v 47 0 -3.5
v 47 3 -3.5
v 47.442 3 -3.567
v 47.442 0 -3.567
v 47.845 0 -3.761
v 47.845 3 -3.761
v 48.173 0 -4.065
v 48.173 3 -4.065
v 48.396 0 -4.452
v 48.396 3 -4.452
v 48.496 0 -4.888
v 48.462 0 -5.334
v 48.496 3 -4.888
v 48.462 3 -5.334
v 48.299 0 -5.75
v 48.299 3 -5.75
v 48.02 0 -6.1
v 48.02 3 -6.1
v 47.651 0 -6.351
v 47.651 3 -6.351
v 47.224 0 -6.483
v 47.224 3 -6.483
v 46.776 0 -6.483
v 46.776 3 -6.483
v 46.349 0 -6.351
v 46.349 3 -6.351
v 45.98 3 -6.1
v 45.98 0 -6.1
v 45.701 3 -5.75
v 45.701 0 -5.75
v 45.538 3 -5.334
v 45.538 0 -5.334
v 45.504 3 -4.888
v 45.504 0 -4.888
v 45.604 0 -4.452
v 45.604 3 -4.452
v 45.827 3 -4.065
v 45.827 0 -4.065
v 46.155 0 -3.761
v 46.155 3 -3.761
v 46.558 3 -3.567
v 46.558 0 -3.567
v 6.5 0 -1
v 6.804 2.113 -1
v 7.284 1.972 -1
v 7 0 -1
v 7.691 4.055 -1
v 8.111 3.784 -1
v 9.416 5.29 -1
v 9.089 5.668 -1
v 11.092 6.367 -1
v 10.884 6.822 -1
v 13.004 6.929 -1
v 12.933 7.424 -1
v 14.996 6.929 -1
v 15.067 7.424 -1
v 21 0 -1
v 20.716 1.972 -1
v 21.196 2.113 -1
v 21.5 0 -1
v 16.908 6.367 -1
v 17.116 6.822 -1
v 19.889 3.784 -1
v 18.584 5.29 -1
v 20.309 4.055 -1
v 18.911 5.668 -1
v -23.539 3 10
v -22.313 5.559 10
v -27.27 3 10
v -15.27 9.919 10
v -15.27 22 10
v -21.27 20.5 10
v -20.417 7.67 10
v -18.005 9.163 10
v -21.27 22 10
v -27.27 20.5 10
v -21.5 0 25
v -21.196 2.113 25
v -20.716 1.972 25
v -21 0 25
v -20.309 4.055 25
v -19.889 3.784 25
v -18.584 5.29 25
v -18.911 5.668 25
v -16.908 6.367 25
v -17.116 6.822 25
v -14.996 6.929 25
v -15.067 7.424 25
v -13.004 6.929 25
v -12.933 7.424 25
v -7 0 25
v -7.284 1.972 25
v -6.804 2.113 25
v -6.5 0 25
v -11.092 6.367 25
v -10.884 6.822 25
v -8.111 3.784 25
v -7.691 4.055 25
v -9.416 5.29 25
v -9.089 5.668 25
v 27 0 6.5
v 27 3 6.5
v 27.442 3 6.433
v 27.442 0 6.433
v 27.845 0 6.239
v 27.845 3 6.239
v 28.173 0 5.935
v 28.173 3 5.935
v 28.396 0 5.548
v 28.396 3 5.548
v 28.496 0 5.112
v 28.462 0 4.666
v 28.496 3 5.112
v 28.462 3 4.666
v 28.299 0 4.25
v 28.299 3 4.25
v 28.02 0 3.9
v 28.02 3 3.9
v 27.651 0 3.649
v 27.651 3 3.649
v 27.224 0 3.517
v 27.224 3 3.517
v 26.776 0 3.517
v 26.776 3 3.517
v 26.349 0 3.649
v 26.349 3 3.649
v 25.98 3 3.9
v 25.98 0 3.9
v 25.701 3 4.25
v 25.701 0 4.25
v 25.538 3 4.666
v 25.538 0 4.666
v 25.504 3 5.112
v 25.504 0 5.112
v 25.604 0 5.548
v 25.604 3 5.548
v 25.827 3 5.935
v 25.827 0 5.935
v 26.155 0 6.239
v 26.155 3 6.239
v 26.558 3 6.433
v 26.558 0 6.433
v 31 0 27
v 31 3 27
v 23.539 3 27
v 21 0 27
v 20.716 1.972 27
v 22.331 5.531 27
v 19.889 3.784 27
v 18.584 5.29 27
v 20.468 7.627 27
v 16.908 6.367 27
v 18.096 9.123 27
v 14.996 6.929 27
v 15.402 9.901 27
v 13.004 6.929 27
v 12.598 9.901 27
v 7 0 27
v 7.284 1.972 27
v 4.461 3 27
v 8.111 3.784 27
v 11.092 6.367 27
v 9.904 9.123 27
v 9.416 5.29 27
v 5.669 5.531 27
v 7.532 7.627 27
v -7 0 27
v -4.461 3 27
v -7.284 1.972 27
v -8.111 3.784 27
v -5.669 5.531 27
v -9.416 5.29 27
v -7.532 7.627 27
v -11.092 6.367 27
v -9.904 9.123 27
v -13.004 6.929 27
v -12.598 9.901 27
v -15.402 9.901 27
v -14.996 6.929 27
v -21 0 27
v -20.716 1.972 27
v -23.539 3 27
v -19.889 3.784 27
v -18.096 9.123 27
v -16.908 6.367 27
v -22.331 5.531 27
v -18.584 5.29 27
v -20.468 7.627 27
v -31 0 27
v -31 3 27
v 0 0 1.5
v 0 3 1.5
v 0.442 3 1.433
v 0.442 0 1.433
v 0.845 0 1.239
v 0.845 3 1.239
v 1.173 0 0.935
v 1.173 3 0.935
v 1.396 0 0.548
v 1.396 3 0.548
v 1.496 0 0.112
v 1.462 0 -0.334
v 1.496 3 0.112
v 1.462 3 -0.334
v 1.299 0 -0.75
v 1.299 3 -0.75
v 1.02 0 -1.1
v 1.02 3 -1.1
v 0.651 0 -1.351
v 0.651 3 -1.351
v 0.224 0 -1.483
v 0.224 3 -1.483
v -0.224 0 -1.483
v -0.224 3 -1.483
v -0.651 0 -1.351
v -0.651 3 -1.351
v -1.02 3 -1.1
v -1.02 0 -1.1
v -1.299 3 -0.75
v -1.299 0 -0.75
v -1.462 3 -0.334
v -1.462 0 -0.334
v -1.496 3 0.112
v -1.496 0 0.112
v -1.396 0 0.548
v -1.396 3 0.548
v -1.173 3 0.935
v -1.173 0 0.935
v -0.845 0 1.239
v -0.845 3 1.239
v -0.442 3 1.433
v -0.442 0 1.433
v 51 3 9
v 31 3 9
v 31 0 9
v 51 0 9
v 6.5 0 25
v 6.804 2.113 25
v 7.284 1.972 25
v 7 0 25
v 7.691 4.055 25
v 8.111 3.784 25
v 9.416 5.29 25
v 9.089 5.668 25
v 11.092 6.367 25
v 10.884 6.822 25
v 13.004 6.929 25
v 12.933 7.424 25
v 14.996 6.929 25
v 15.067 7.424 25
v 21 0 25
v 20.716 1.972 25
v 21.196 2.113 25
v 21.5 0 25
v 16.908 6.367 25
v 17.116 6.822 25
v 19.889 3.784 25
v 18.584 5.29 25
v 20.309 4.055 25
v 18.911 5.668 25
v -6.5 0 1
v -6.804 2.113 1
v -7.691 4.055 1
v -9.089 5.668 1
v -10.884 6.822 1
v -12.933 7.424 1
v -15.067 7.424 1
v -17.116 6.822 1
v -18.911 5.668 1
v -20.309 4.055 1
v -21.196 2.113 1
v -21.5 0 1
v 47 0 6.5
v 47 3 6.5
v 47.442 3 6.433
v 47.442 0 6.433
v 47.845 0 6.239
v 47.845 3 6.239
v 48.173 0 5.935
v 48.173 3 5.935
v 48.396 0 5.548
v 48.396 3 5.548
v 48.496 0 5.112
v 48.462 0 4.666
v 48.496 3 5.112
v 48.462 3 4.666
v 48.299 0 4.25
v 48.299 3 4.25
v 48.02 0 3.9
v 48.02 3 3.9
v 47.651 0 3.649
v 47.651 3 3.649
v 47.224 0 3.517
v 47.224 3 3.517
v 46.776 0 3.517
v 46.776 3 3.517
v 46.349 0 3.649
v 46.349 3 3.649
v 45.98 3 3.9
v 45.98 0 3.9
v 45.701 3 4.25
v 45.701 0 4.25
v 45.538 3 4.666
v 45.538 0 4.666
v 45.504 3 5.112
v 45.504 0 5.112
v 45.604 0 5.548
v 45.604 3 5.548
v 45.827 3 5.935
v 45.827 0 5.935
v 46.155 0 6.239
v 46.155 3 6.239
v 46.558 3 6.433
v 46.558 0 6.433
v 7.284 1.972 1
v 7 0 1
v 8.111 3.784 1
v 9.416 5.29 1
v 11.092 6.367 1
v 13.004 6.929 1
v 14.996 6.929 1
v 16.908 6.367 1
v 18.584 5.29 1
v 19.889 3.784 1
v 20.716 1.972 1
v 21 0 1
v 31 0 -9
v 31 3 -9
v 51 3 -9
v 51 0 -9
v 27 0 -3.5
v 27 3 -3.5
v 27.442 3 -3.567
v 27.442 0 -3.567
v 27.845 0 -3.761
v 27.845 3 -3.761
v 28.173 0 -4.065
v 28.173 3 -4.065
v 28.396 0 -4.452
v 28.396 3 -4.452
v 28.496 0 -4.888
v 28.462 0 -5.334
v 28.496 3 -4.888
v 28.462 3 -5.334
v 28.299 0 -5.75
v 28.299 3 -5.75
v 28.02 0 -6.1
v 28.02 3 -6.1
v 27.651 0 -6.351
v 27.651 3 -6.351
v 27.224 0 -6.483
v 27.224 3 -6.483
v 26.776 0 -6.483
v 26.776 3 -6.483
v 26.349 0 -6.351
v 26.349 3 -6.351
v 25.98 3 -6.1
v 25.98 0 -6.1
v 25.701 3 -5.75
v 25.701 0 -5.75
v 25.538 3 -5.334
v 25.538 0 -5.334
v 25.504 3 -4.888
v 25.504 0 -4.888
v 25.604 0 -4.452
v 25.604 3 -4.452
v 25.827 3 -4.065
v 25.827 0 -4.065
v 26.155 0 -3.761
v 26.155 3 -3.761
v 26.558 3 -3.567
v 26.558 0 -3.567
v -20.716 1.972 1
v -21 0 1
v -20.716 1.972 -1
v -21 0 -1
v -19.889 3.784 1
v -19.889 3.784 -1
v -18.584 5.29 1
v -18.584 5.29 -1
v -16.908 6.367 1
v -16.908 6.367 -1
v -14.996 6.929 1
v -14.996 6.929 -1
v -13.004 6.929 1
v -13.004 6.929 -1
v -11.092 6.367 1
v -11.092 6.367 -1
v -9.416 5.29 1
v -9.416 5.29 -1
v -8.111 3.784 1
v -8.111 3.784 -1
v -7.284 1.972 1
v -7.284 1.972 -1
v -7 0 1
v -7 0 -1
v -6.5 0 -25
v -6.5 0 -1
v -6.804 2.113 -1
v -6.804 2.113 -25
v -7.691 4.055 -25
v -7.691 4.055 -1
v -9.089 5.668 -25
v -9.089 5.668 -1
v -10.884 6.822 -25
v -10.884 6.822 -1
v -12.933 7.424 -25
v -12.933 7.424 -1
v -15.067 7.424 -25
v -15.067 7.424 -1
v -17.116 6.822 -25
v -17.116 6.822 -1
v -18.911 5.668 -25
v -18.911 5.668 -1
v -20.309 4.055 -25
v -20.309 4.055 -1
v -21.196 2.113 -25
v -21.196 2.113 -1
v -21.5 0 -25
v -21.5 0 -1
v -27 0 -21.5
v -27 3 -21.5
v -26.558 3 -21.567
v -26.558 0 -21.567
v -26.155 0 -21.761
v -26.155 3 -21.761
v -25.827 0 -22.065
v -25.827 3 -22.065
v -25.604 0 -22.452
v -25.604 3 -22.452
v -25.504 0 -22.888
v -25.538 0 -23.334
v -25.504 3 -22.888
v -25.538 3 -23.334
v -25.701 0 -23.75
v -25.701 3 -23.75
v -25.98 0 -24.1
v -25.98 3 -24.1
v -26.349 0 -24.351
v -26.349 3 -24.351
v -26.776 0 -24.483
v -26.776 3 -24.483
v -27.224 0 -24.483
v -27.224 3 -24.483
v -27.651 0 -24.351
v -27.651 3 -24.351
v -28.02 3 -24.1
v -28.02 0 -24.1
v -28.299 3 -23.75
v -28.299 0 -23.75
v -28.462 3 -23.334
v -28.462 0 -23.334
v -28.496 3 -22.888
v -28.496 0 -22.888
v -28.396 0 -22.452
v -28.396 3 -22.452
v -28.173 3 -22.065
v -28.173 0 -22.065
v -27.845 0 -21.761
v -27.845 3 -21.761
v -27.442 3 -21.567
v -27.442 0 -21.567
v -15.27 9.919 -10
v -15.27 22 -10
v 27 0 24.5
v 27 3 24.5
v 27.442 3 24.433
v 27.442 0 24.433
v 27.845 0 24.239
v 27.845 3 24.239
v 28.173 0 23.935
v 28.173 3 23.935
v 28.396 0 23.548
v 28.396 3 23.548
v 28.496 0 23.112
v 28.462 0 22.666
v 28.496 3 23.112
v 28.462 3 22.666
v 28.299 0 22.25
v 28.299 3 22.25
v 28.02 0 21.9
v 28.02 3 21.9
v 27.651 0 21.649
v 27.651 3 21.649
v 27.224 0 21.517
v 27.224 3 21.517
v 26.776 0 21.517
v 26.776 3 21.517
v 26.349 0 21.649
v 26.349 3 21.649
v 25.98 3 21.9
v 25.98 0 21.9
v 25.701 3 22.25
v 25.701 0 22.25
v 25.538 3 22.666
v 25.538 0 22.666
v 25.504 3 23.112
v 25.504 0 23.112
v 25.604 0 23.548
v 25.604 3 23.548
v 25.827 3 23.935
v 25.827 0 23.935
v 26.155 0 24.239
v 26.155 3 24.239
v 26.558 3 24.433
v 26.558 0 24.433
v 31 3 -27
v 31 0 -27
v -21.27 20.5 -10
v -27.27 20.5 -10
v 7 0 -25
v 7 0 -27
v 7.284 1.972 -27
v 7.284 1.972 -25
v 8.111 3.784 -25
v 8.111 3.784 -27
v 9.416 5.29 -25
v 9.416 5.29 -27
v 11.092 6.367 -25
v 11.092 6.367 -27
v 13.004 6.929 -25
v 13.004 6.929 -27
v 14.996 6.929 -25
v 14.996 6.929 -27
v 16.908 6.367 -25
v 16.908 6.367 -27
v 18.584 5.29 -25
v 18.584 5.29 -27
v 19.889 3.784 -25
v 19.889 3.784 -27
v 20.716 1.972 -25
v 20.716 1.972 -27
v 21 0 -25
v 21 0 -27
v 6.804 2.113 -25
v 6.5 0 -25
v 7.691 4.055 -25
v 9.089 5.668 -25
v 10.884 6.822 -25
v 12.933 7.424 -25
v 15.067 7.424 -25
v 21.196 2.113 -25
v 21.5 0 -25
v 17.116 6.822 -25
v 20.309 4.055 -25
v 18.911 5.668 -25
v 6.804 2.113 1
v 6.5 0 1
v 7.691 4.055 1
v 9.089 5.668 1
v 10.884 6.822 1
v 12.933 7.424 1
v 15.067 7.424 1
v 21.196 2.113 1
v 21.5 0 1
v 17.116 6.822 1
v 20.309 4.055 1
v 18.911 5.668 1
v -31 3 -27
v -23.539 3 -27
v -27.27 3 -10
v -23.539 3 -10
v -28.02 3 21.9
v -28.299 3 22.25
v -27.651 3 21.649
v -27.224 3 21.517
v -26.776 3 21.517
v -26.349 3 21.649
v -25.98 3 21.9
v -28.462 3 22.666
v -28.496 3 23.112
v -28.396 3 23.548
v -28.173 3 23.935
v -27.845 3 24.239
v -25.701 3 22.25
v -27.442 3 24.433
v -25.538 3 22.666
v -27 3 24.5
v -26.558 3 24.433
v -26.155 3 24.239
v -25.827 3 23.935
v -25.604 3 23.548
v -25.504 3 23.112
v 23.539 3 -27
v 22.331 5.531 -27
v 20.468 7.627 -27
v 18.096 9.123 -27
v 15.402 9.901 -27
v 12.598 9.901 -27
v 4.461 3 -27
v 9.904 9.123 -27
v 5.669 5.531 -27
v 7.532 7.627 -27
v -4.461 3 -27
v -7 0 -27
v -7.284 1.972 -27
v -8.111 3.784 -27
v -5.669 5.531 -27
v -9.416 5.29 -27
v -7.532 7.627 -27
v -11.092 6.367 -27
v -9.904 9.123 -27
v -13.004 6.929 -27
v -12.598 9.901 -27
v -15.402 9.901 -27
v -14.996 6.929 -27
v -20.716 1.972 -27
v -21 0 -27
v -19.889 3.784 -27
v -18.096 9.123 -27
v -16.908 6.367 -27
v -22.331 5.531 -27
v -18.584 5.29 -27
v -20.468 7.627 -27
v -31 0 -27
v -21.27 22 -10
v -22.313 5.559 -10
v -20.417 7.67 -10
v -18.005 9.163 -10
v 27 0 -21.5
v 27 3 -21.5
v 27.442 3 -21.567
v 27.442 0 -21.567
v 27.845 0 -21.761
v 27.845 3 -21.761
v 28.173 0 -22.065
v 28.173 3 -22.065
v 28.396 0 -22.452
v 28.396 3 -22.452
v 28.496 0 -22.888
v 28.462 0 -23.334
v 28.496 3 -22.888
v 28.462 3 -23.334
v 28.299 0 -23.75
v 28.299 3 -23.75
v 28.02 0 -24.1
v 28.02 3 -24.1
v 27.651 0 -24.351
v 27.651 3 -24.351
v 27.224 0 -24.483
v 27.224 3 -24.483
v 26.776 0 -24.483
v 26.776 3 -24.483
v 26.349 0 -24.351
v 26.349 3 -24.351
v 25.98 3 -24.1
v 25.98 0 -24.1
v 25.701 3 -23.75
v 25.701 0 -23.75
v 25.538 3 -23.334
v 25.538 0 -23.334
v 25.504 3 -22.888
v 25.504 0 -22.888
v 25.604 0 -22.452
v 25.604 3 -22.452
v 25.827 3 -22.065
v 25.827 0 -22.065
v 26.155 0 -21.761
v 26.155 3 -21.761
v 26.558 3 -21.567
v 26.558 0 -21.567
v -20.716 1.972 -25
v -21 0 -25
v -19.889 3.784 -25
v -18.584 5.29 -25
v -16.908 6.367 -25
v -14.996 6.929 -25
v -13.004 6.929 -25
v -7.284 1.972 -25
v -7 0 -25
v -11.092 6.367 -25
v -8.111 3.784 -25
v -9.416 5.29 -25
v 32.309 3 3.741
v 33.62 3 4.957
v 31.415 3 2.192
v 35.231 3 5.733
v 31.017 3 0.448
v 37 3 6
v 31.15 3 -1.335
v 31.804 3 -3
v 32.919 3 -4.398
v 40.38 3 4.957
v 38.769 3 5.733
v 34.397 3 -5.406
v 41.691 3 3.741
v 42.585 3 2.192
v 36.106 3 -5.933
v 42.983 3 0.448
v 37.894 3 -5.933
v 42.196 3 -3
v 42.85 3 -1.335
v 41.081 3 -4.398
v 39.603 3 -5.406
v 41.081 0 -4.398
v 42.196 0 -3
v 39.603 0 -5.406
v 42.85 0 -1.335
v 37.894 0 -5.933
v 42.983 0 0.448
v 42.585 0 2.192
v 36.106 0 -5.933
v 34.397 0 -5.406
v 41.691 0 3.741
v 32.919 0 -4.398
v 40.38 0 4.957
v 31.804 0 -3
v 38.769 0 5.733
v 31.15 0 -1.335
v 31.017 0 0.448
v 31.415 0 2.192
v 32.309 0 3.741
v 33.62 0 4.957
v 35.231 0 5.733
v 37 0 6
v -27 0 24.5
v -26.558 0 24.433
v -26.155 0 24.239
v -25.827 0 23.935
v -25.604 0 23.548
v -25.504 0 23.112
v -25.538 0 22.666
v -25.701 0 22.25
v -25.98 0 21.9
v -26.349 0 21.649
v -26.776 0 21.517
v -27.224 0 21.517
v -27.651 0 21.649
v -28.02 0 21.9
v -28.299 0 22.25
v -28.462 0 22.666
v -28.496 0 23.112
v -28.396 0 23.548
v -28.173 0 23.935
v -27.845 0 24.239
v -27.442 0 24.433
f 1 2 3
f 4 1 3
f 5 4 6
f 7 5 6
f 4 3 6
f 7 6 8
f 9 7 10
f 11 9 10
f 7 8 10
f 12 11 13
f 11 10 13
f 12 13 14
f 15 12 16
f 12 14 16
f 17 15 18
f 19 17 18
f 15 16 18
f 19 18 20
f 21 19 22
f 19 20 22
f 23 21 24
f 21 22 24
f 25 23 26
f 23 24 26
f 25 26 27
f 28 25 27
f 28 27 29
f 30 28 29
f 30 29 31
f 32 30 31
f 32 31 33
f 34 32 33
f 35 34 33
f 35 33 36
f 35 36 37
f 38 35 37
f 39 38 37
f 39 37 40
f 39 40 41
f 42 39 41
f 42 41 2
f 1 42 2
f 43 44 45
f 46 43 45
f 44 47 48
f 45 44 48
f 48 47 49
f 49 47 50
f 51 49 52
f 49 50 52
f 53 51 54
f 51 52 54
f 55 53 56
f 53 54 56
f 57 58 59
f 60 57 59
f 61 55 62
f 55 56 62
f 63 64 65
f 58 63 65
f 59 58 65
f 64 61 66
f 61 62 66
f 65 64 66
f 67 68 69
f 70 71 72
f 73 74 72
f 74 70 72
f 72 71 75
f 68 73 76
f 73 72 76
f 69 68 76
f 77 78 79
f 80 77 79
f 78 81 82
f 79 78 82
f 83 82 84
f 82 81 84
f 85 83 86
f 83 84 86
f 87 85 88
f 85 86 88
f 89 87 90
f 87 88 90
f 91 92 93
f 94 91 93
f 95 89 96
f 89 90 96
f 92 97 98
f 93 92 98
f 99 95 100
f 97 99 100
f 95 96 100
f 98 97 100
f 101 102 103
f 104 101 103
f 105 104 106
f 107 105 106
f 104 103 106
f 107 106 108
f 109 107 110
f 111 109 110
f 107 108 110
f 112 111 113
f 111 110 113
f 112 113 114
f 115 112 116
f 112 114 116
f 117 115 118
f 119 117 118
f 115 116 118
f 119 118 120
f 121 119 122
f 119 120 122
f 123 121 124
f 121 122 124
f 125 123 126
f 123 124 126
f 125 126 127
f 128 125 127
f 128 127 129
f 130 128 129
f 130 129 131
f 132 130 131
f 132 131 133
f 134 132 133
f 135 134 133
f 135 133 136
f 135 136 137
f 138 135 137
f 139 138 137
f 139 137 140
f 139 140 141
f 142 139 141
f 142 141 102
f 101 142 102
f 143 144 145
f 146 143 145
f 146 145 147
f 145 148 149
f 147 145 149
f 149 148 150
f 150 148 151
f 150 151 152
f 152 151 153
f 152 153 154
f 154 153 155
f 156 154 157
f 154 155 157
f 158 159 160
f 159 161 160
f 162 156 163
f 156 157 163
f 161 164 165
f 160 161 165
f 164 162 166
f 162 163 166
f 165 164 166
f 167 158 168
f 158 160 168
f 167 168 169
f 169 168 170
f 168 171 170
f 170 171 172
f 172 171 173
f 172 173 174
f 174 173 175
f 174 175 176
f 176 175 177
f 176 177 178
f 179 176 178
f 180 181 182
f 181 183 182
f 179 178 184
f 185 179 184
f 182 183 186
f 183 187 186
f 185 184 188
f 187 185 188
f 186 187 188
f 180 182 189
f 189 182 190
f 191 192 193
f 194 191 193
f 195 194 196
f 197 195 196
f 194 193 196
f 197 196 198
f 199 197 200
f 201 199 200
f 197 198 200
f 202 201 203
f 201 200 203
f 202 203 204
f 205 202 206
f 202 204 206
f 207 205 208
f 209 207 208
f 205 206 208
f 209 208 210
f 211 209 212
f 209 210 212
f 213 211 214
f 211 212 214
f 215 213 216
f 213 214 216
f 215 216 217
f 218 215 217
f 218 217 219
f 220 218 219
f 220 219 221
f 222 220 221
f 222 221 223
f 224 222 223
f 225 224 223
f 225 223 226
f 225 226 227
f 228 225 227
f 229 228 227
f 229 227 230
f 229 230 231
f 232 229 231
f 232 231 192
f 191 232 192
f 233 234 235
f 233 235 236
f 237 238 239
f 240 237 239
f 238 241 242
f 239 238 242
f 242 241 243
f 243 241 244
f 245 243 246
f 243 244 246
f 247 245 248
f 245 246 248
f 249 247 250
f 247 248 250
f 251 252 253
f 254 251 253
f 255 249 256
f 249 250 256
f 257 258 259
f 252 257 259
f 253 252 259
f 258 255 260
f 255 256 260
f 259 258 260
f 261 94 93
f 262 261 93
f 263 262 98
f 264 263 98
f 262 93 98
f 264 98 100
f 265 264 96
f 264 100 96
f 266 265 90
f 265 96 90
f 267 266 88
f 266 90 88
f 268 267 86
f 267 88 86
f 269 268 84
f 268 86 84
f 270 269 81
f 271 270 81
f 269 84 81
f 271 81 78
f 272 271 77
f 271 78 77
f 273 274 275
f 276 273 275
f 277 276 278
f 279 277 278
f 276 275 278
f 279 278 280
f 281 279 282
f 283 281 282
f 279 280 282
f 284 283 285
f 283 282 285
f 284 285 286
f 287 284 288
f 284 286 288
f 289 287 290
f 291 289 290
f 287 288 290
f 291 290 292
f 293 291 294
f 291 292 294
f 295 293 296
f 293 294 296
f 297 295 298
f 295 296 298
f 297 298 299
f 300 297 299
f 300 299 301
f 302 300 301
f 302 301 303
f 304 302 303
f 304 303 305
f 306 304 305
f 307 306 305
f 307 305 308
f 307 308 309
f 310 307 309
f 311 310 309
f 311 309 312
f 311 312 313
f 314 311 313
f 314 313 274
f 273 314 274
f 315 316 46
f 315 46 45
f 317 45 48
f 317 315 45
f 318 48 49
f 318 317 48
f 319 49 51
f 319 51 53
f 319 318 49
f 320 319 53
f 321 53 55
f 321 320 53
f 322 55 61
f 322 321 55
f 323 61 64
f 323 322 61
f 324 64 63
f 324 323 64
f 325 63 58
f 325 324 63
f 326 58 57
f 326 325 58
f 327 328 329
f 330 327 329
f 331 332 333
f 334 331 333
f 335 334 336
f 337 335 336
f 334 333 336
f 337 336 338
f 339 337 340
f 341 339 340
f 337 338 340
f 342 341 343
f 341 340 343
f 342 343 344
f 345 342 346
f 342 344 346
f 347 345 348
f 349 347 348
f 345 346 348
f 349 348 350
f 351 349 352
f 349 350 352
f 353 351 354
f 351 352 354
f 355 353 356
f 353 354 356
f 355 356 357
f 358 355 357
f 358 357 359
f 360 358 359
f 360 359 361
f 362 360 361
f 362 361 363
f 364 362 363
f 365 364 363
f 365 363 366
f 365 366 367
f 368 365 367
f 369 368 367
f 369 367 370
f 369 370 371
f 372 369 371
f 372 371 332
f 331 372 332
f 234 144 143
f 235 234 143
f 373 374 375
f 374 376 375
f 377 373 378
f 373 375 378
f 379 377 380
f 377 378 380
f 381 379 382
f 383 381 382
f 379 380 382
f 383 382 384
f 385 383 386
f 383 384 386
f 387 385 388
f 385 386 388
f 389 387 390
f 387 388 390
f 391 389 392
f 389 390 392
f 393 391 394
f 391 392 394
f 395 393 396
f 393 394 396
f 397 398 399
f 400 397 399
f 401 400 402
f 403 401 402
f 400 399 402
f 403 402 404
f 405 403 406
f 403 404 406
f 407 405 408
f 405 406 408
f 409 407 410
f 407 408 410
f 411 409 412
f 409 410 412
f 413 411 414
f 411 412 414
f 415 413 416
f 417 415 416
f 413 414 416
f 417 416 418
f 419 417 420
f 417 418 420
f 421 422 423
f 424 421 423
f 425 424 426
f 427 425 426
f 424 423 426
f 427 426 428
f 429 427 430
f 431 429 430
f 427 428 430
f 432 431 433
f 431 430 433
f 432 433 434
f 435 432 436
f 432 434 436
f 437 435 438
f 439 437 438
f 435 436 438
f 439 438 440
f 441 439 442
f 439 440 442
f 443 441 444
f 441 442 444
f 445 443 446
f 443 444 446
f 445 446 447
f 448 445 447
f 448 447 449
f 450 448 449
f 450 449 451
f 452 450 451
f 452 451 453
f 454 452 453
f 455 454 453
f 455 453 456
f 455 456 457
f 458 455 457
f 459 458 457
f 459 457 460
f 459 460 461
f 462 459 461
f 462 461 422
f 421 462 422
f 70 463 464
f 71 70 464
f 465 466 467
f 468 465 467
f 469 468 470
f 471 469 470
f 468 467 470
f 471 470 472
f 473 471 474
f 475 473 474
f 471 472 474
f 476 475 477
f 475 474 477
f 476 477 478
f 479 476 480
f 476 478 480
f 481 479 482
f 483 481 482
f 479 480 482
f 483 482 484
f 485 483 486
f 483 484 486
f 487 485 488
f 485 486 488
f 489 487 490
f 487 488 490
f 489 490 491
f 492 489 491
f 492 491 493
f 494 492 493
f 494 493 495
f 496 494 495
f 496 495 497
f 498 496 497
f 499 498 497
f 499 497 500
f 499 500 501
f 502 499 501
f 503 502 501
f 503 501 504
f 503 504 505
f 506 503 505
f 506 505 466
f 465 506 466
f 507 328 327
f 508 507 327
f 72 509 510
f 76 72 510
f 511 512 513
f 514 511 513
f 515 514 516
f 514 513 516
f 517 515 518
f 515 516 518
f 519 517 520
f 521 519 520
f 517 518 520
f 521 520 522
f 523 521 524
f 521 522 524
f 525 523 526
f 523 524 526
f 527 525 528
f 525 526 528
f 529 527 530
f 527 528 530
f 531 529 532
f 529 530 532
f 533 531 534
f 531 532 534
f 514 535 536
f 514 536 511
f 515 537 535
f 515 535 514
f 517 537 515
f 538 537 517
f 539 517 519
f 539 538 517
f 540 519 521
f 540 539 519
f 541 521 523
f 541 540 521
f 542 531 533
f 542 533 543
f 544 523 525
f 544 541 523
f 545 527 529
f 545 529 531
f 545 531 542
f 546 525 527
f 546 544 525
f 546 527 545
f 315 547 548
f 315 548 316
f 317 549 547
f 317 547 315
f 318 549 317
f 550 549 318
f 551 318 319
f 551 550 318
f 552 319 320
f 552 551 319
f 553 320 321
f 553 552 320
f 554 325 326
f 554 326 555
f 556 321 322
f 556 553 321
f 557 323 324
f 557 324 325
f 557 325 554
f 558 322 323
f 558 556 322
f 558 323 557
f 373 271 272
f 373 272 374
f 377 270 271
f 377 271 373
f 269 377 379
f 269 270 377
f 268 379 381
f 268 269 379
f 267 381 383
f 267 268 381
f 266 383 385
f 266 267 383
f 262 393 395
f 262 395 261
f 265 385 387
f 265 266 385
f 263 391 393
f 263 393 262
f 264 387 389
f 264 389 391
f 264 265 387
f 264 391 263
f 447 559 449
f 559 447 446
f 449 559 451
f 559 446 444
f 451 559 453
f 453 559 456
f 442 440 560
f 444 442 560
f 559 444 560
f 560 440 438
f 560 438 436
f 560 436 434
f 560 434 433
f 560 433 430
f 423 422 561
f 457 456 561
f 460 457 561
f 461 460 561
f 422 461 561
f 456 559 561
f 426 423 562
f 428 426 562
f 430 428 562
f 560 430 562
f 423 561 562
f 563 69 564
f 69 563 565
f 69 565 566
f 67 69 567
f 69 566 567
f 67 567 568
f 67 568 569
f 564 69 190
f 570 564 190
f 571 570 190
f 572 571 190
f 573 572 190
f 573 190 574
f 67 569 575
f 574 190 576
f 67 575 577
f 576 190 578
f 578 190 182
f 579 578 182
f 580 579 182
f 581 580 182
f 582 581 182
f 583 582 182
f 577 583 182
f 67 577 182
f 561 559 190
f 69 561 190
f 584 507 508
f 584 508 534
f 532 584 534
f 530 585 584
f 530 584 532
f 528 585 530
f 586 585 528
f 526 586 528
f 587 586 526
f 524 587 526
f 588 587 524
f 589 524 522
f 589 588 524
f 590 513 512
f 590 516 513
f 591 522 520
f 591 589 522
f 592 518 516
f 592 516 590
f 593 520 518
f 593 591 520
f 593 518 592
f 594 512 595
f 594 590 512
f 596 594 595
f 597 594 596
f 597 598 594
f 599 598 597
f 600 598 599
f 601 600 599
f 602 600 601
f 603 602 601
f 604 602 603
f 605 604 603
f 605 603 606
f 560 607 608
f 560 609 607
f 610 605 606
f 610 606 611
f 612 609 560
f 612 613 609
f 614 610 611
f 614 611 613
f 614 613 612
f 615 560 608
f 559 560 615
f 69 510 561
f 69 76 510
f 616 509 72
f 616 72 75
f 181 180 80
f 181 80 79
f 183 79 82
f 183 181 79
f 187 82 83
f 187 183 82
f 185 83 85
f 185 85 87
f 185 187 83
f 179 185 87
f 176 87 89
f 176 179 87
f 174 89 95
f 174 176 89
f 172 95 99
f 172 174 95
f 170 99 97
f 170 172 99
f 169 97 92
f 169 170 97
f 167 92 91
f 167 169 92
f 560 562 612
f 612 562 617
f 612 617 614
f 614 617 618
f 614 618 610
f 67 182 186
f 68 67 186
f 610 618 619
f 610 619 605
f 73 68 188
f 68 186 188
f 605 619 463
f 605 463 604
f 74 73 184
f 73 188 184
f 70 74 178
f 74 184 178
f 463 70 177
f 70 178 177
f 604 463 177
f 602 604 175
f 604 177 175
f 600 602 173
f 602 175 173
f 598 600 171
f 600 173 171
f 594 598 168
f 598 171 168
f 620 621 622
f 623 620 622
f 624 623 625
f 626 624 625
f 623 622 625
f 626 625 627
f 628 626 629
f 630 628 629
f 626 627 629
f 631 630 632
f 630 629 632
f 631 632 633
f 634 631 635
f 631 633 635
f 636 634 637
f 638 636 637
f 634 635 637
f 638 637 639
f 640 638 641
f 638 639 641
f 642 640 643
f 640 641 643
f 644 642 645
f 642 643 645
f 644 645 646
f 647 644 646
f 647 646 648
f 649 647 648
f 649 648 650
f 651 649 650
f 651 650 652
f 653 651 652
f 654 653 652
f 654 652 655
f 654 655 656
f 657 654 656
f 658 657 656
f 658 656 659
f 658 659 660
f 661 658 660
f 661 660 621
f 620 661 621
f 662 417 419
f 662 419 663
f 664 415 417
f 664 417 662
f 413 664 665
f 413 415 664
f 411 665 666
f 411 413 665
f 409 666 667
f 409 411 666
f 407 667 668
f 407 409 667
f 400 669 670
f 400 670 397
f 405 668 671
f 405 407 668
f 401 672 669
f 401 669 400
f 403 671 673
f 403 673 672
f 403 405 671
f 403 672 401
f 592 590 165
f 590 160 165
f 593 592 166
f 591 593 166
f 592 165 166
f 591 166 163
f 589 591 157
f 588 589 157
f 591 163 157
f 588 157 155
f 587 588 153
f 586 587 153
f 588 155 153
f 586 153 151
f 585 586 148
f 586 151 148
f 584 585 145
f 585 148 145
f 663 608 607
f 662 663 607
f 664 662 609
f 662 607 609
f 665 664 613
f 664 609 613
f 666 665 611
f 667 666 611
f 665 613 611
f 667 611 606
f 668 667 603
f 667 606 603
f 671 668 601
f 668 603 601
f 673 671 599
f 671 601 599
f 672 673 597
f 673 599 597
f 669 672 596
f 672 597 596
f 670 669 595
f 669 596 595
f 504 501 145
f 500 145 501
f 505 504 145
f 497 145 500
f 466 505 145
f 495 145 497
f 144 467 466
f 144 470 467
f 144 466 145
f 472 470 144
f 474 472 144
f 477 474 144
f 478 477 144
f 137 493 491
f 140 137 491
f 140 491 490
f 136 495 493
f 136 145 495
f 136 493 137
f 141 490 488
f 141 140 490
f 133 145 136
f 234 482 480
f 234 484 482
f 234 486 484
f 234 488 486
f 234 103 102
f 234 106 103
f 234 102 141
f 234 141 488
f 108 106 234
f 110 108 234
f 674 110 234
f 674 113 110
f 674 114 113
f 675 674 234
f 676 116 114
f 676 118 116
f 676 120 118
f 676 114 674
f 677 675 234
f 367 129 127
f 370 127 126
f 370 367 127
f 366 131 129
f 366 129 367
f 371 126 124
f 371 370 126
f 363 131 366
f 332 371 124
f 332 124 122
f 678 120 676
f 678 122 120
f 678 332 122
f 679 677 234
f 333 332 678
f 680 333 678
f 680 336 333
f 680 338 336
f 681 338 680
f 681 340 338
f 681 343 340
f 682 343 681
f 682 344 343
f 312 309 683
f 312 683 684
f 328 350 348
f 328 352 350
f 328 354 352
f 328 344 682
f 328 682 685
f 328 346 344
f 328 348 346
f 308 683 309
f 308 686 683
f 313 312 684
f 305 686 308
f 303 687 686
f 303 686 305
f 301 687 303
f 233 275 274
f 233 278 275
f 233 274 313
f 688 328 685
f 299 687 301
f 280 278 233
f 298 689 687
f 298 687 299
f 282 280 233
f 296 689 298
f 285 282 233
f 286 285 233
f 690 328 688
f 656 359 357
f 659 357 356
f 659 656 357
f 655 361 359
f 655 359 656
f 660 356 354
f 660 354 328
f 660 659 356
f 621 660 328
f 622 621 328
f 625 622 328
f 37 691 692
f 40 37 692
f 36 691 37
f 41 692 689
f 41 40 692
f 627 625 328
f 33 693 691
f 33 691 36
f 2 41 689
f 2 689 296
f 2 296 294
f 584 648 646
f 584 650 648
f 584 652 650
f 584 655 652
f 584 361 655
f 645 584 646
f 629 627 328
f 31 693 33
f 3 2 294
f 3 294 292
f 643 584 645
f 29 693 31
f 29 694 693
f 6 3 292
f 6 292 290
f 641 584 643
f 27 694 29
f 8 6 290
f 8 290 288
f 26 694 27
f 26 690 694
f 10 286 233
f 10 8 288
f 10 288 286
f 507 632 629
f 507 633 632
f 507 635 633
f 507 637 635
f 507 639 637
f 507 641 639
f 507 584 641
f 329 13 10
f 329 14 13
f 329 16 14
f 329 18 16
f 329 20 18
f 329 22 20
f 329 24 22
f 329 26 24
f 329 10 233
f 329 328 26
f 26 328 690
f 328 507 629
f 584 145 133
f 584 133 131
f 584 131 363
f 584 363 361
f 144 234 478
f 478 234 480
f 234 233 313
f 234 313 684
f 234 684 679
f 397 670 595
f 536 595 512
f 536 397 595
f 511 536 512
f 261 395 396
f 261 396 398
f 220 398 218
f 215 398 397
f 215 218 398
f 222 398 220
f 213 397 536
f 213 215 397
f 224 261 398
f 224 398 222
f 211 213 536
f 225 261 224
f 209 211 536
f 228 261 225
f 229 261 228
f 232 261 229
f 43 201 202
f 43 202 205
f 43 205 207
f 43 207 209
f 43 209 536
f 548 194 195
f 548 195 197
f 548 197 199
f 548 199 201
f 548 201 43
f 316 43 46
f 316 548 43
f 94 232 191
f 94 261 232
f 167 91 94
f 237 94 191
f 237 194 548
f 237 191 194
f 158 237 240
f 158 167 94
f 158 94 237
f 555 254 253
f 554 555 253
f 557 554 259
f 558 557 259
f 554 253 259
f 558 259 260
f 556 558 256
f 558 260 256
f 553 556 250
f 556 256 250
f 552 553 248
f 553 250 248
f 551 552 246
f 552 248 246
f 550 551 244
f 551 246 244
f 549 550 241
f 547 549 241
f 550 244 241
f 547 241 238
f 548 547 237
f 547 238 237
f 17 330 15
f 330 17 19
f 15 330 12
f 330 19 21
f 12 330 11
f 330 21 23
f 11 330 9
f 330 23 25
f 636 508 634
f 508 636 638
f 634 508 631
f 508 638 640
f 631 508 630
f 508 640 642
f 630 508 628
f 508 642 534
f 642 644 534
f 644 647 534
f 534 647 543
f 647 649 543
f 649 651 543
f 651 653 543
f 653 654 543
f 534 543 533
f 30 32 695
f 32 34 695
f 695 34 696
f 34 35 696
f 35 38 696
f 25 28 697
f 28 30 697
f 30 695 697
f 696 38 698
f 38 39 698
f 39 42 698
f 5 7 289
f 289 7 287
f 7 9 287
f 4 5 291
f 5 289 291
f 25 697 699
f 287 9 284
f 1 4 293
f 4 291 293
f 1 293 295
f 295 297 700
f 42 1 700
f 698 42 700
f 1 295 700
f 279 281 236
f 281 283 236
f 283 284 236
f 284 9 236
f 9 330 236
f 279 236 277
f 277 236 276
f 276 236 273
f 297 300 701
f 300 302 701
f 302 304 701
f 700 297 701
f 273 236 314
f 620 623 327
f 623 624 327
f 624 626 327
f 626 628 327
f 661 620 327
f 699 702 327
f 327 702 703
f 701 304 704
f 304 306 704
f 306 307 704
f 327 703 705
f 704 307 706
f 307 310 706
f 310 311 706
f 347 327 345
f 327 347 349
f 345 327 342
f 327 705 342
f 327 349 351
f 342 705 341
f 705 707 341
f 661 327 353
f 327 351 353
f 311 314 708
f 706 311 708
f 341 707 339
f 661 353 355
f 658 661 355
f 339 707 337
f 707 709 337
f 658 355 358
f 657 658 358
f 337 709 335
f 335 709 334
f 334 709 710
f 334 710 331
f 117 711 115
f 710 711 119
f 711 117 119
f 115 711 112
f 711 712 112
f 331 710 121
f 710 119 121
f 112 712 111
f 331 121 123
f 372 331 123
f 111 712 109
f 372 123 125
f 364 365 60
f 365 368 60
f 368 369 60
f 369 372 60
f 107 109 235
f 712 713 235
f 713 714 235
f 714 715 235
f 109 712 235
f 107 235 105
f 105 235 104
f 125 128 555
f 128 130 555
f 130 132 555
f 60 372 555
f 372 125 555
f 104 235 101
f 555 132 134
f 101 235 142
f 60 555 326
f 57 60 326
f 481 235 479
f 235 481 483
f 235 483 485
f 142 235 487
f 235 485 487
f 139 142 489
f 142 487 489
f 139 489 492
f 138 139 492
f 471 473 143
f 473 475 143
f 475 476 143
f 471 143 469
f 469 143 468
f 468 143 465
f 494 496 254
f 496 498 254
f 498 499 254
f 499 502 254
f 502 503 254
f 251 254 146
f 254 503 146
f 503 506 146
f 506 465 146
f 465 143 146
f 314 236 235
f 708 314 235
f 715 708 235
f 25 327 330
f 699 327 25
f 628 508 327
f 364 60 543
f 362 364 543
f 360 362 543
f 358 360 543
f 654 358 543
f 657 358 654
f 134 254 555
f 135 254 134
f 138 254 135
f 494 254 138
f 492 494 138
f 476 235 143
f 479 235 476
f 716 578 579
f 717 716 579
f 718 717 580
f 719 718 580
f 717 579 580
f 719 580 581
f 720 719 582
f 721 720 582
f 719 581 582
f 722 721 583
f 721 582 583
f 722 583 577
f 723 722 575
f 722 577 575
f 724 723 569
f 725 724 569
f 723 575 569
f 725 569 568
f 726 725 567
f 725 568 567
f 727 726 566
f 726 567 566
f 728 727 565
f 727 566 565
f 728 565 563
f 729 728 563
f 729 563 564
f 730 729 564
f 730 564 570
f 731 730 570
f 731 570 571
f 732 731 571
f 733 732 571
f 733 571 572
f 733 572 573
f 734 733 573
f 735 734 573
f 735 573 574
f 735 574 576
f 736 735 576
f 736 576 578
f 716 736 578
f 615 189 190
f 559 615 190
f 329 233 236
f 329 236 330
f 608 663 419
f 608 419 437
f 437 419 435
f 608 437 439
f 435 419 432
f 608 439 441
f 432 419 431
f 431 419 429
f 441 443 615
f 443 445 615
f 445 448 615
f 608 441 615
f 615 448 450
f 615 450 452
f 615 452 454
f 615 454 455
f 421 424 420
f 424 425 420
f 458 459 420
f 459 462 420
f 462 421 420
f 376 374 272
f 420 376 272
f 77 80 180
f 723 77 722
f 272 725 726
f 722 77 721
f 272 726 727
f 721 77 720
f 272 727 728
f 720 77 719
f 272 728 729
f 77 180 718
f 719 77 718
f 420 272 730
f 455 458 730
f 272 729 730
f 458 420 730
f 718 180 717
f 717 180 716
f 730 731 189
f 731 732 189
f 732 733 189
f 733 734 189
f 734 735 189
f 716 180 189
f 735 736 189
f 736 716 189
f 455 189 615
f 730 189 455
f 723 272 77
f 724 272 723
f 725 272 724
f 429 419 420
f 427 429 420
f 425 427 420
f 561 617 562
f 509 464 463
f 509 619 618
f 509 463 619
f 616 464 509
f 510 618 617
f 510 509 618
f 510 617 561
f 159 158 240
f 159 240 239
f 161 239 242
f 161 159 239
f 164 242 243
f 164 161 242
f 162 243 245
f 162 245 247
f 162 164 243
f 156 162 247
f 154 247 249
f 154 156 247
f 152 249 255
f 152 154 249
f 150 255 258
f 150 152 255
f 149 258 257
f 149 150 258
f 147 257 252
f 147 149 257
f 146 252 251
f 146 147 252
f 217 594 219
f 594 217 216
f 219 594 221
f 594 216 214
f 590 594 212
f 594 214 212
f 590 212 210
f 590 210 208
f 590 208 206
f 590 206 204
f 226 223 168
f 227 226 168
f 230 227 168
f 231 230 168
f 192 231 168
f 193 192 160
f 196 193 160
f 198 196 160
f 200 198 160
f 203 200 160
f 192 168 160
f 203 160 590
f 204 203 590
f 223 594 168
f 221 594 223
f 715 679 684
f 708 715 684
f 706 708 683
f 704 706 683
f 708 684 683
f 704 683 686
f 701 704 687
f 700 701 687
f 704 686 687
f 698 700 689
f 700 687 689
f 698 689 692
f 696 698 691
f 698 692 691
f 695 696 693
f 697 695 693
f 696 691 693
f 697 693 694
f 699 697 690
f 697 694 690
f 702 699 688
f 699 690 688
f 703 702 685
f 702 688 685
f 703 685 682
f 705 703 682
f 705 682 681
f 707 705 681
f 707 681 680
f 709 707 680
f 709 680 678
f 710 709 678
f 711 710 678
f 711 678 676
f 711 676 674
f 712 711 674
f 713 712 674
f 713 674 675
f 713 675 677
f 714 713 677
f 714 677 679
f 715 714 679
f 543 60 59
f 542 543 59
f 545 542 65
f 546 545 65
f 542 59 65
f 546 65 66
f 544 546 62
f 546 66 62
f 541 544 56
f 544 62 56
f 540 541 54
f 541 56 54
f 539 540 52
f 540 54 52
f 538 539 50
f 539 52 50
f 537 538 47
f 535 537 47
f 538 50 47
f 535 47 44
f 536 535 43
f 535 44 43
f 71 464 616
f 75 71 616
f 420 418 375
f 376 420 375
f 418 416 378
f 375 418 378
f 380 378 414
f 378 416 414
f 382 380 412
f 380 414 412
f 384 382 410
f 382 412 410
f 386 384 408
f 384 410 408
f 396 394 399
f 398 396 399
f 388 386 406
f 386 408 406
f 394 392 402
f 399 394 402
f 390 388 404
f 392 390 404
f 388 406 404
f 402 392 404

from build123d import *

# Parameters (mm, degrees)
BOSS_EXTRUDE1_DEPTH = 27
BOSS_EXTRUDE2_DEPTH = 2
BOSS_EXTRUDE3_DEPTH = 1
SKETCH4_R           = 1.5
CUT_EXTRUDE1_DEPTH  = 42.701318924
SKETCH5_W           = 27.460607986
SKETCH5_H           = 18
BOSS_EXTRUDE4_DEPTH = 3
SKETCH6_R           = 1.5
SKETCH6_R_2         = 6
CUT_EXTRUDE2_DEPTH  = 59.129166517
BOSS_EXTRUDE5_DEPTH = 10
SKETCH8_W           = 6
SKETCH8_H           = 1.5
BOSS_EXTRUDE6_DEPTH = 20


with BuildPart() as part:
    # Sketch1 → Boss-Extrude1 (new, symmetric)
    with BuildSketch(Plane.XY):
        with BuildLine():
            Line((-31, 3), (-23.539392014, 3))
            ThreePointArc((-23.539392014, 3), (-14, 10), (-4.460607986, 3))
            Line((-4.460607986, 3), (4.460607986, 3))
            ThreePointArc((4.460607986, 3), (14, 10), (23.539392014, 3))
            Line((23.539392014, 3), (31, 3))
            Line((31, 3), (31, 0))
            Line((31, 0), (21.5, 0))
            ThreePointArc((21.5, 0), (14, 7.5), (6.5, 0))
            Line((6.5, 0), (-6.5, 0))
            ThreePointArc((-6.5, 0), (-14, 7.5), (-21.5, 0))
            Line((-21.5, 0), (-31, 0))
            Line((-31, 0), (-31, 3))
        make_face()
    extrude(amount=BOSS_EXTRUDE1_DEPTH, both=True)

    # Sketch2 → Boss-Extrude2 (add)
    with BuildSketch(Plane.XY.offset(27)):
        with BuildLine():
            Line((-22, 0), (-21, 0))
            ThreePointArc((-21, 0), (-14, 7), (-7, 0))
            Line((-7, 0), (-6, 0))
            ThreePointArc((-6, 0), (-14, 8), (-22, 0))
        make_face()
        with BuildLine():
            Line((21, 0), (22, 0))
            ThreePointArc((22, 0), (14, 8), (6, 0))
            Line((6, 0), (7, 0))
            ThreePointArc((7, 0), (14, 7), (21, 0))
        make_face()
    boss_extrude2 = extrude(amount=-BOSS_EXTRUDE2_DEPTH)

    # Mirror1: Boss-Extrude2 across plane
    add(boss_extrude2.mirror(Plane.XY))

    # Sketch3 → Boss-Extrude3 (add, symmetric)
    with BuildSketch(Plane.XY):
        with BuildLine():
            Line((-22, 0), (-21, 0))
            ThreePointArc((-21, 0), (-14, 7), (-7, 0))
            Line((-7, 0), (-6, 0))
            ThreePointArc((-6, 0), (-14, 8), (-22, 0))
        make_face()
        with BuildLine():
            Line((6, 0), (7, 0))
            ThreePointArc((7, 0), (14, 7), (21, 0))
            Line((21, 0), (22, 0))
            ThreePointArc((22, 0), (14, 8), (6, 0))
        make_face()
    extrude(amount=BOSS_EXTRUDE3_DEPTH, both=True)

    # Sketch4 → Cut-Extrude1 (cut, through all)
    with BuildSketch(Plane(origin=(0, 3, 0), x_dir=(1, 0, 0), z_dir=(0, 1, 0))):
        with Locations(Location((-27, 23, 0), (0, 0, 270))):
            Circle(SKETCH4_R)
        with Locations(Location((-27, -23, 0), (0, 0, 270))):
            Circle(SKETCH4_R)
        with Locations(Location((27, -23, 0), (0, 0, 270))):
            Circle(SKETCH4_R)
        with Locations(Location((27, 23, 0), (0, 0, 270))):
            Circle(SKETCH4_R)
        with Locations(Location((0, 0, 0), (0, 0, 270))):
            Circle(SKETCH4_R)
    extrude(amount=-CUT_EXTRUDE1_DEPTH, mode=Mode.SUBTRACT)

    # Sketch5 → Boss-Extrude4 (add)
    with BuildSketch(Plane(origin=(0, 3, 0), x_dir=(1, 0, 0), z_dir=(0, 1, 0))):
        with Locations((37.269696007, 0)):
            Rectangle(SKETCH5_W, SKETCH5_H)
    extrude(amount=-BOSS_EXTRUDE4_DEPTH)

    # Sketch6 → Cut-Extrude2 (cut, through all)
    with BuildSketch(Plane(origin=(0, 3, 0), x_dir=(1, 0, 0), z_dir=(0, 1, 0))):
        with Locations(Location((47, 5, 0), (0, 0, 270))):
            Circle(SKETCH6_R)
        with Locations(Location((47, -5, 0), (0, 0, 270))):
            Circle(SKETCH6_R)
        with Locations(Location((27, -5, 0), (0, 0, 270))):
            Circle(SKETCH6_R)
        with Locations(Location((27, 5, 0), (0, 0, 270))):
            Circle(SKETCH6_R)
        with Locations(Location((37, 0, 0), (0, 0, 270))):
            Circle(SKETCH6_R_2)
    extrude(amount=-CUT_EXTRUDE2_DEPTH, mode=Mode.SUBTRACT)

    # Sketch7 → Boss-Extrude5 (add, symmetric)
    with BuildSketch(Plane.XY):
        with BuildLine():
            Line((-27.269696007, 3), (-23.539392014, 3))
            ThreePointArc((-23.539392014, 3), (-20.416966951, 7.669585071), (-15.269696007, 9.919066088))
            Line((-15.269696007, 9.919066088), (-15.269696007, 20.5))
            Line((-15.269696007, 20.5), (-27.269696007, 20.5))
            Line((-27.269696007, 20.5), (-27.269696007, 3))
        make_face()
    extrude(amount=BOSS_EXTRUDE5_DEPTH, both=True)

    # Sketch8 → Boss-Extrude6 (add)
    with BuildSketch(Plane(origin=(0, 0, -10), x_dir=(-1, 0, 0), z_dir=(0, 0, -1))):
        with Locations((18.269696007, 21.25)):
            Rectangle(SKETCH8_W, SKETCH8_H)
    extrude(amount=-BOSS_EXTRUDE6_DEPTH)


solid = part.part
